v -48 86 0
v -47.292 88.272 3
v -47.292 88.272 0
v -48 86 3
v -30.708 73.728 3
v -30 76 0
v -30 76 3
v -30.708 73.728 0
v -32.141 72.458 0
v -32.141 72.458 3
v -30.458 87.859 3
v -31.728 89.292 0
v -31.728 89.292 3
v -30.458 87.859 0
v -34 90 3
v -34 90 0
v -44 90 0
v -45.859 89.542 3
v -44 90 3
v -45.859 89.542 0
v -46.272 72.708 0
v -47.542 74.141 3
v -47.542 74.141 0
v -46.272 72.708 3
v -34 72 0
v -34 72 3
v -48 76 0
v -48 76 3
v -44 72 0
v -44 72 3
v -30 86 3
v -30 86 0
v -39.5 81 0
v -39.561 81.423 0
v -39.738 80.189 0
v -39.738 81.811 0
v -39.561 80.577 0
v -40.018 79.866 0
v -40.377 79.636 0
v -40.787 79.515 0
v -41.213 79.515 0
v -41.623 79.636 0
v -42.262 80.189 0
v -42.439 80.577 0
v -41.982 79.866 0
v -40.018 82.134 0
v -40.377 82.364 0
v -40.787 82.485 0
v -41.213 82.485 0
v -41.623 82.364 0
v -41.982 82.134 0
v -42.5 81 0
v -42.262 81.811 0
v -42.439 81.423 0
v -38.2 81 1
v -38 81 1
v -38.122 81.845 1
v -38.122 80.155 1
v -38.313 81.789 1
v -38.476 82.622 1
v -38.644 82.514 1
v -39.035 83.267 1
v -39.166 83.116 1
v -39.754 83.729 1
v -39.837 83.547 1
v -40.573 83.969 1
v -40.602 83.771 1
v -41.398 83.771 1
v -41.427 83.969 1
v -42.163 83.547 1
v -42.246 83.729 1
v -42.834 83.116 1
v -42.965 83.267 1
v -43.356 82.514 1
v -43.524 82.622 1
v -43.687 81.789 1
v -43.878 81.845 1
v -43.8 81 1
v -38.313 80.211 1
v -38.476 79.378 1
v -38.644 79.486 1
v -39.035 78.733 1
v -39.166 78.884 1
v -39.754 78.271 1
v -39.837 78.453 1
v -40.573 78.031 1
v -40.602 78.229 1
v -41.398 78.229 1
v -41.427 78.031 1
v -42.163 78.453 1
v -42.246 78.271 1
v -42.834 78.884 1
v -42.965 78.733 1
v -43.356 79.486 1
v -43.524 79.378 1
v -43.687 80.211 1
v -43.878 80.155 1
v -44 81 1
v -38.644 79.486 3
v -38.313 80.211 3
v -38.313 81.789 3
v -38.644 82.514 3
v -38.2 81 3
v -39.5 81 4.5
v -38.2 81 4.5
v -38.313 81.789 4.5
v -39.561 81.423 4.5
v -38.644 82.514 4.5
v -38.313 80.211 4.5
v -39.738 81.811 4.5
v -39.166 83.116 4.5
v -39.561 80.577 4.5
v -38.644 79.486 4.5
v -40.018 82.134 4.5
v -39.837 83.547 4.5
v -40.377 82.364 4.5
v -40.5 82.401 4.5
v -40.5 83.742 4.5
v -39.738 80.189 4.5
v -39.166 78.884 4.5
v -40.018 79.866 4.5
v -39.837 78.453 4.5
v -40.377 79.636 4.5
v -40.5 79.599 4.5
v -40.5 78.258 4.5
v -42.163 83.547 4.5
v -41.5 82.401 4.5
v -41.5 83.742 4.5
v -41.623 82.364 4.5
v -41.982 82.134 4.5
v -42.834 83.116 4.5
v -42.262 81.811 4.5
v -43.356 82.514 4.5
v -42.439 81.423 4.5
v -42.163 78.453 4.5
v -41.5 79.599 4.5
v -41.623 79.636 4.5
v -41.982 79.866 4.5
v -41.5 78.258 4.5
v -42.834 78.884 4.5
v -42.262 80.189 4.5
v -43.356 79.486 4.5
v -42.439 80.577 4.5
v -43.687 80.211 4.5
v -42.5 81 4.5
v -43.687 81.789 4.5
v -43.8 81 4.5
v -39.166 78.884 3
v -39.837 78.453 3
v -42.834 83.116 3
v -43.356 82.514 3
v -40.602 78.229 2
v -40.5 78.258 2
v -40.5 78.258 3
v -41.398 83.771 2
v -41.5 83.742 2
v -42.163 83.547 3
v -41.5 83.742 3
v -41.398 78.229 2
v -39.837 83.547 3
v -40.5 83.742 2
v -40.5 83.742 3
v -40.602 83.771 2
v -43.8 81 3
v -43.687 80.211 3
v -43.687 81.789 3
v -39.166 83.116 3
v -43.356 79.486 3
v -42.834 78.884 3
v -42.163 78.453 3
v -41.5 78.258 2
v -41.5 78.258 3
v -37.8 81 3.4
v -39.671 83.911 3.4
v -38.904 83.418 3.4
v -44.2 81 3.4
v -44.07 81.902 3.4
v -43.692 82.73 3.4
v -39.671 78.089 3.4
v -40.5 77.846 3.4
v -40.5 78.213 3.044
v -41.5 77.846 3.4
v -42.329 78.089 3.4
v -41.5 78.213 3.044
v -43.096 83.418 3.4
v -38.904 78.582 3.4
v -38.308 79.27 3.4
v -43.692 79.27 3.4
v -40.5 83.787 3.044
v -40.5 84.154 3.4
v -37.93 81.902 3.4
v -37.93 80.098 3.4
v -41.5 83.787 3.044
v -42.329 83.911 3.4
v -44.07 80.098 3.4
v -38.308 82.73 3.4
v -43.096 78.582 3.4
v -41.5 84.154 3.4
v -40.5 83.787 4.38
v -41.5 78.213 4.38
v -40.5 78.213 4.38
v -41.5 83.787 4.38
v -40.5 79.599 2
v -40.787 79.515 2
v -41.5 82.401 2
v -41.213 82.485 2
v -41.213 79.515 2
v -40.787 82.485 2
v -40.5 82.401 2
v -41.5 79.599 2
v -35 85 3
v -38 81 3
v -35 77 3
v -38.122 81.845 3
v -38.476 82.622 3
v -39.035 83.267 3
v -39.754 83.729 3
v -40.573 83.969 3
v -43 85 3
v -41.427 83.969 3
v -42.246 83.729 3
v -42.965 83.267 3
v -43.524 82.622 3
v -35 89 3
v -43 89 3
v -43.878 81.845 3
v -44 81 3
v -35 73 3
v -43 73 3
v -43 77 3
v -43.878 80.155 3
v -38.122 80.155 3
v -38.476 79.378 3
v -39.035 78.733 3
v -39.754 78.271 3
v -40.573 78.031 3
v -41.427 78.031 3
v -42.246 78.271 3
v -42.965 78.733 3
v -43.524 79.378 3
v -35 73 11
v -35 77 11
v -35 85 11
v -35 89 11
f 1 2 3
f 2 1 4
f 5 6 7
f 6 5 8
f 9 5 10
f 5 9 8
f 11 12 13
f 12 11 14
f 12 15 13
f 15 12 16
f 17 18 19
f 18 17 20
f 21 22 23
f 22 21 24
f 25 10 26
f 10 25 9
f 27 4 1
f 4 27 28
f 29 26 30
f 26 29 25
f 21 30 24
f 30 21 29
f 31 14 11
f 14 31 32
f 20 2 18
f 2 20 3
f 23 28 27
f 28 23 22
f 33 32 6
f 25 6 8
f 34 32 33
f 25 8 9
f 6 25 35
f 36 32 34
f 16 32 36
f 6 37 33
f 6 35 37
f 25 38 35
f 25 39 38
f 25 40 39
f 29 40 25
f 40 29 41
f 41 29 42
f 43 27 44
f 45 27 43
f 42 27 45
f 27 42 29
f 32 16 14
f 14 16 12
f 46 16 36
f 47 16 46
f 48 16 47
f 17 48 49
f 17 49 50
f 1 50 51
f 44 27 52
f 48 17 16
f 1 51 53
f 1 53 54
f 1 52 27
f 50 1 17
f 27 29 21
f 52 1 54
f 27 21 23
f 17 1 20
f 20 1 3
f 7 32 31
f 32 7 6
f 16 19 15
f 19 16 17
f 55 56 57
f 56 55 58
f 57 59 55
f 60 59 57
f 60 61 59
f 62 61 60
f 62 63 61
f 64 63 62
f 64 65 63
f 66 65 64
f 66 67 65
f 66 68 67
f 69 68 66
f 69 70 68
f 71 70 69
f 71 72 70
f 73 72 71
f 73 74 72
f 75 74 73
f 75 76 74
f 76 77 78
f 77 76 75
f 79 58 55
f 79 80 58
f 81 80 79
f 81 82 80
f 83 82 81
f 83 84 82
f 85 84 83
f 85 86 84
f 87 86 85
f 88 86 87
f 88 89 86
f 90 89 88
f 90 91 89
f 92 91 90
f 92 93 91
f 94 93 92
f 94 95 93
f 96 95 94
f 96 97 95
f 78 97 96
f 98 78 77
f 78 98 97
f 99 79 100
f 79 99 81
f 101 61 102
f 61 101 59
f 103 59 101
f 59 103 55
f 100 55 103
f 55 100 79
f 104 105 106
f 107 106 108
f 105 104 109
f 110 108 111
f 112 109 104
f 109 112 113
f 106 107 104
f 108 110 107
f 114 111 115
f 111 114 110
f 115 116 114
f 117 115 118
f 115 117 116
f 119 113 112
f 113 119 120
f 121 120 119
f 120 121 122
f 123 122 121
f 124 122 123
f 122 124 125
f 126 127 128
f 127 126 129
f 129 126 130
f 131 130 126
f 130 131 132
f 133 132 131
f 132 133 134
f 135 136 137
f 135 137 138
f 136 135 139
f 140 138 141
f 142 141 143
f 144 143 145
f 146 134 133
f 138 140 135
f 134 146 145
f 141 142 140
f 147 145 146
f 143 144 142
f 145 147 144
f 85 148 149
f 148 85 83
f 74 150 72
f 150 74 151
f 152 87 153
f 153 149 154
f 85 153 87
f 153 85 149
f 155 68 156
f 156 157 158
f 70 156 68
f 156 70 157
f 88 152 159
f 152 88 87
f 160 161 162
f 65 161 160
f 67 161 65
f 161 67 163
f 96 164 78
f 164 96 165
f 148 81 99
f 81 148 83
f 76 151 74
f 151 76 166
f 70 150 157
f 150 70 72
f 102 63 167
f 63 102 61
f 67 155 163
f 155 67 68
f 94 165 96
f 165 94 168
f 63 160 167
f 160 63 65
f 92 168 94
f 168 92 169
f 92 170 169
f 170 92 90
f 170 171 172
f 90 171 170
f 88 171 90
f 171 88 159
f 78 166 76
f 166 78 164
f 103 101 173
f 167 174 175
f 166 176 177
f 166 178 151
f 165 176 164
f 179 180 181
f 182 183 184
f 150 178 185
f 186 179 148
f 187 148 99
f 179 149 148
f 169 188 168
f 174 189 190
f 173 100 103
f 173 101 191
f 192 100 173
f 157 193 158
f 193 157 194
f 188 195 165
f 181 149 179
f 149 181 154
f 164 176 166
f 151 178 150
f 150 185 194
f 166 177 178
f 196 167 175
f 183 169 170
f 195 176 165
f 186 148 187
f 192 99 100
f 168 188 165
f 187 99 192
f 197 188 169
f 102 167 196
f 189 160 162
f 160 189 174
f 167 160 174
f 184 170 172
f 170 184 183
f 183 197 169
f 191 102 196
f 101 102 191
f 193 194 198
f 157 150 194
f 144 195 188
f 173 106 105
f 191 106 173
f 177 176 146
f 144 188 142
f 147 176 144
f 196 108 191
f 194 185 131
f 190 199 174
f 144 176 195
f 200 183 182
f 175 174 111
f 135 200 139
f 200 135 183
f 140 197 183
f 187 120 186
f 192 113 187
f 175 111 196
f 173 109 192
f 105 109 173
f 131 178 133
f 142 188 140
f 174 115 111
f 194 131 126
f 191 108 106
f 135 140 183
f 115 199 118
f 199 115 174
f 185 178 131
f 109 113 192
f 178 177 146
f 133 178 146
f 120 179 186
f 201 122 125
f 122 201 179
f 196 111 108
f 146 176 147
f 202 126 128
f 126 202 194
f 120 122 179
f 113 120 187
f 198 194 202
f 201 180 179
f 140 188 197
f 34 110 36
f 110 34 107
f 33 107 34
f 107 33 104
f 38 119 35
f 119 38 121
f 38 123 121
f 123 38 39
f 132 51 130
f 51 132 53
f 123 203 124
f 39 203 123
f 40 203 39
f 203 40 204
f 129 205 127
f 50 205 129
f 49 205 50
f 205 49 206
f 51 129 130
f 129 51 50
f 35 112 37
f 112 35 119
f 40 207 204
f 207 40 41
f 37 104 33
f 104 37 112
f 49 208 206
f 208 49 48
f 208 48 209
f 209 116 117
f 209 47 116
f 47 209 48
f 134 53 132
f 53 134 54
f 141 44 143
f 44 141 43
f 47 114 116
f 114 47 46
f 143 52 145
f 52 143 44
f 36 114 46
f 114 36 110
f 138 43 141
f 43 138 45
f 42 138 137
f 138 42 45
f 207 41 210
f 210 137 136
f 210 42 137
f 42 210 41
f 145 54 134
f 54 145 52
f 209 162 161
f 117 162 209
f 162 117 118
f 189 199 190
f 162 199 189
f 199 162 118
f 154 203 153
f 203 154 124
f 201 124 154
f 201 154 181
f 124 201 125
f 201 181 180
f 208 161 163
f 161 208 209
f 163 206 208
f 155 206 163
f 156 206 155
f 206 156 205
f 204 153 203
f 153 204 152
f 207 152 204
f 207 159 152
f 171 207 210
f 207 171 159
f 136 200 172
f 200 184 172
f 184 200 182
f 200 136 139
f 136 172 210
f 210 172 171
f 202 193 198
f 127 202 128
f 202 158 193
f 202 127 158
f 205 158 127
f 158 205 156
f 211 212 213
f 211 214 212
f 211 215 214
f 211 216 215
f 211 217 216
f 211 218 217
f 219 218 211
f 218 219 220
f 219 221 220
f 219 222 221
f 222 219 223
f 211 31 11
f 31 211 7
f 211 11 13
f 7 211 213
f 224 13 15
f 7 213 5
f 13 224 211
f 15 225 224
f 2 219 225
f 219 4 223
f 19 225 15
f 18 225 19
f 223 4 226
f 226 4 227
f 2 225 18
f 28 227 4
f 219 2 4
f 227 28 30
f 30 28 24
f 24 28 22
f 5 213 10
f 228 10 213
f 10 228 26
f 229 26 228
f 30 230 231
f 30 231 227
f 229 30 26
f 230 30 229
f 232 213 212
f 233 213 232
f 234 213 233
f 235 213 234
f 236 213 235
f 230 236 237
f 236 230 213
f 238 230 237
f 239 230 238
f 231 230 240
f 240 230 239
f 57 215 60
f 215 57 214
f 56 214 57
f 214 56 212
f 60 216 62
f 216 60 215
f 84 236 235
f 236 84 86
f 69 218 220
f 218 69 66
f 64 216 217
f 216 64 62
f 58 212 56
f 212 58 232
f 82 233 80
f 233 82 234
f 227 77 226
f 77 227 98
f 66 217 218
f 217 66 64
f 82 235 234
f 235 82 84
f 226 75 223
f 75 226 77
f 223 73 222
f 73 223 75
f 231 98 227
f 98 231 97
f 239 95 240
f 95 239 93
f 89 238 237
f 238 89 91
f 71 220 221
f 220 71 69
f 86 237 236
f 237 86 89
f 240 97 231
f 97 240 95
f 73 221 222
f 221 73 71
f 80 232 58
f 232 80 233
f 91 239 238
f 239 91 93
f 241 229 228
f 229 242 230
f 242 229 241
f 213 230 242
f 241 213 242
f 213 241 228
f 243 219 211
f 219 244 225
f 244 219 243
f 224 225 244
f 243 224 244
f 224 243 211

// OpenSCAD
// file: Mbox2a.scad
// Mbox2a.scad
// This is the box base


//----------------------------------------------
module post1(){
        difference(){
        union(){
            // foot
            linear_extrude(height=1)
            offset(r=4)
            square([10,10]);    
            
            // outer cylinder
            translate([3,5,0])
            cylinder(r=2.8,h=4.5,$fn=22);

            // flanges
            translate([3,5,3])
            cylinder(r1=2.8,r2=3.2,h=0.4,$fn=22);
            translate([3,5,3.4])
            cylinder(r1=3.2,r2=2.8,h=1.1,$fn=22);
        }
        // cut hole thru center
        translate([3,5,-1])
        cylinder(r=1.5,h=7,$fn=22);
        // cut slots to allow insertion
        translate([3,5,5])
        cube([1,12,6],center=true);
    }
}   // end of module post1

//----------------------------------------------
module post2(){
        difference(){
        union(){
            // foot
            linear_extrude(height=1)
            offset(r=4)
            square([10,10]);    
            
            // outer cylinder
            translate([6,5,0])
            cylinder(r=2.8,h=4.5,$fn=22);

            // flanges
            translate([6,5,3])
            cylinder(r1=2.8,r2=3.2,h=0.4,$fn=22);
            translate([6,5,3.4])
            cylinder(r1=3.2,r2=2.8,h=1.1,$fn=22);
        }
        // cut hole thru center
        translate([6,5,-1])
        cylinder(r=1.5,h=7,$fn=22);
        // cut slots to allow insertion
        translate([6,5,5])
        cube([1,12,6],center=true);
    }
}   // end of module post1
//===============================================

// translate baseplate and rim 
translate([-33,-35,0]){

/*
// baseplate
linear_extrude(height=1)
offset(r=2)
square([90,125]);
*/
// baseplate with holes cut
difference(){
    linear_extrude(height=1)
    offset(r=2)
    square([90,125]);

    for(i=[0:2]){
        translate([40+i*20,40,-1])
        rotate([0,0,30])
        cylinder(r=10,h=10,$fn=6);
    }
    for(i=[0:1]){
        translate([50+i*20,40+18*1,-1])
        rotate([0,0,30])
        cylinder(r=10,h=10,$fn=6);
    }
    for(i=[0:2]){
        translate([40+i*20,40+18*2,-1])
        rotate([0,0,30])
        cylinder(r=10,h=10,$fn=6);
    }
    for(i=[-2:1]){
        translate([50+i*20,40+18*3,-1])
        rotate([0,0,30])
        cylinder(r=10,h=10,$fn=6);
    }
    for(i=[-1,1]){
        translate([40+i*20,40+18*4,-1])
        rotate([0,0,30])
        cylinder(r=10,h=10,$fn=6);
    }
}


// 1 mm lip all around edge of baseplate
difference(){    
    translate([0,0,1])    
    linear_extrude(height=2)
    offset(r=1)
    square([90,125]);    

    translate([0,0,1])    
    linear_extrude(height=3)
    offset(r=0)
    square([90,125]);    
    }


}   // end of translate for base    
    
// posts for the pi
translate([52.5,81.5,1]){
    cylinder(r=2.5,h=2,$fn=20);
    cylinder(r=1.1,h=3.4,$fn=20);
}    
translate([52.5,23.5,1]){
    cylinder(r=2.5,h=2,$fn=20);
    cylinder(r=1.1,h=3.4,$fn=20);
}    
translate([3.5,81.5,1]){
    cylinder(r=2.5,h=2,$fn=20);
    cylinder(r=1.1,h=3.4,$fn=20);
}    
translate([3.5,23.5,1]){
    cylinder(r=2.5,h=2,$fn=20);
    cylinder(r=1.1,h=3.4,$fn=20);
}    
      
// boss for PoE
difference(){
    color("pink")
    translate([-32,-33,1])
    linear_extrude(height=5)
    offset(r=1)
    square([29,81]);

    color("cyan")
    translate([-31,-32,1])
    linear_extrude(height=6)
    offset(r=1)
    square([26.5,78]);
    
    // extra little cutout for the audio jack
    translate([-5,26,1])
    cube([4,15,6]);
}

// mounting ears

color("green")
translate([-44,76,0])    
post1();

translate([-44,-30,0])    
post1();

translate([58,76,0])    
post2();

translate([58,-30,0])    
post2();
   


// add text
translate ([26,-20,1]) color("red") 
    linear_extrude(height=0.35){
    text("M 1", font = "Open Sans:style=Bold", size=16,halign="center",valign="center",spacing=1.1);
    }
// main file
// Test the junction

use <Mbox2a.scad>

color("green")
translate([-44,76,0])    
post1();

px1=[ [0,0], [8,0], [0,8] ];
translate([-44,76,0+1])    {
    difference(){
        linear_extrude(height=2)
        offset(r=4)
        square([10,10]);    
        
        translate([3,5,-1])
        cylinder(r=3,h=4,$fn=22);
    }    
    translate([9,-3,2])
    rotate([90,0,180])
    linear_extrude(height=4)
    polygon(points=px1);
    translate([9,9,2])
    rotate([90,0,180])
    linear_extrude(height=4)
    polygon(points=px1);
}
